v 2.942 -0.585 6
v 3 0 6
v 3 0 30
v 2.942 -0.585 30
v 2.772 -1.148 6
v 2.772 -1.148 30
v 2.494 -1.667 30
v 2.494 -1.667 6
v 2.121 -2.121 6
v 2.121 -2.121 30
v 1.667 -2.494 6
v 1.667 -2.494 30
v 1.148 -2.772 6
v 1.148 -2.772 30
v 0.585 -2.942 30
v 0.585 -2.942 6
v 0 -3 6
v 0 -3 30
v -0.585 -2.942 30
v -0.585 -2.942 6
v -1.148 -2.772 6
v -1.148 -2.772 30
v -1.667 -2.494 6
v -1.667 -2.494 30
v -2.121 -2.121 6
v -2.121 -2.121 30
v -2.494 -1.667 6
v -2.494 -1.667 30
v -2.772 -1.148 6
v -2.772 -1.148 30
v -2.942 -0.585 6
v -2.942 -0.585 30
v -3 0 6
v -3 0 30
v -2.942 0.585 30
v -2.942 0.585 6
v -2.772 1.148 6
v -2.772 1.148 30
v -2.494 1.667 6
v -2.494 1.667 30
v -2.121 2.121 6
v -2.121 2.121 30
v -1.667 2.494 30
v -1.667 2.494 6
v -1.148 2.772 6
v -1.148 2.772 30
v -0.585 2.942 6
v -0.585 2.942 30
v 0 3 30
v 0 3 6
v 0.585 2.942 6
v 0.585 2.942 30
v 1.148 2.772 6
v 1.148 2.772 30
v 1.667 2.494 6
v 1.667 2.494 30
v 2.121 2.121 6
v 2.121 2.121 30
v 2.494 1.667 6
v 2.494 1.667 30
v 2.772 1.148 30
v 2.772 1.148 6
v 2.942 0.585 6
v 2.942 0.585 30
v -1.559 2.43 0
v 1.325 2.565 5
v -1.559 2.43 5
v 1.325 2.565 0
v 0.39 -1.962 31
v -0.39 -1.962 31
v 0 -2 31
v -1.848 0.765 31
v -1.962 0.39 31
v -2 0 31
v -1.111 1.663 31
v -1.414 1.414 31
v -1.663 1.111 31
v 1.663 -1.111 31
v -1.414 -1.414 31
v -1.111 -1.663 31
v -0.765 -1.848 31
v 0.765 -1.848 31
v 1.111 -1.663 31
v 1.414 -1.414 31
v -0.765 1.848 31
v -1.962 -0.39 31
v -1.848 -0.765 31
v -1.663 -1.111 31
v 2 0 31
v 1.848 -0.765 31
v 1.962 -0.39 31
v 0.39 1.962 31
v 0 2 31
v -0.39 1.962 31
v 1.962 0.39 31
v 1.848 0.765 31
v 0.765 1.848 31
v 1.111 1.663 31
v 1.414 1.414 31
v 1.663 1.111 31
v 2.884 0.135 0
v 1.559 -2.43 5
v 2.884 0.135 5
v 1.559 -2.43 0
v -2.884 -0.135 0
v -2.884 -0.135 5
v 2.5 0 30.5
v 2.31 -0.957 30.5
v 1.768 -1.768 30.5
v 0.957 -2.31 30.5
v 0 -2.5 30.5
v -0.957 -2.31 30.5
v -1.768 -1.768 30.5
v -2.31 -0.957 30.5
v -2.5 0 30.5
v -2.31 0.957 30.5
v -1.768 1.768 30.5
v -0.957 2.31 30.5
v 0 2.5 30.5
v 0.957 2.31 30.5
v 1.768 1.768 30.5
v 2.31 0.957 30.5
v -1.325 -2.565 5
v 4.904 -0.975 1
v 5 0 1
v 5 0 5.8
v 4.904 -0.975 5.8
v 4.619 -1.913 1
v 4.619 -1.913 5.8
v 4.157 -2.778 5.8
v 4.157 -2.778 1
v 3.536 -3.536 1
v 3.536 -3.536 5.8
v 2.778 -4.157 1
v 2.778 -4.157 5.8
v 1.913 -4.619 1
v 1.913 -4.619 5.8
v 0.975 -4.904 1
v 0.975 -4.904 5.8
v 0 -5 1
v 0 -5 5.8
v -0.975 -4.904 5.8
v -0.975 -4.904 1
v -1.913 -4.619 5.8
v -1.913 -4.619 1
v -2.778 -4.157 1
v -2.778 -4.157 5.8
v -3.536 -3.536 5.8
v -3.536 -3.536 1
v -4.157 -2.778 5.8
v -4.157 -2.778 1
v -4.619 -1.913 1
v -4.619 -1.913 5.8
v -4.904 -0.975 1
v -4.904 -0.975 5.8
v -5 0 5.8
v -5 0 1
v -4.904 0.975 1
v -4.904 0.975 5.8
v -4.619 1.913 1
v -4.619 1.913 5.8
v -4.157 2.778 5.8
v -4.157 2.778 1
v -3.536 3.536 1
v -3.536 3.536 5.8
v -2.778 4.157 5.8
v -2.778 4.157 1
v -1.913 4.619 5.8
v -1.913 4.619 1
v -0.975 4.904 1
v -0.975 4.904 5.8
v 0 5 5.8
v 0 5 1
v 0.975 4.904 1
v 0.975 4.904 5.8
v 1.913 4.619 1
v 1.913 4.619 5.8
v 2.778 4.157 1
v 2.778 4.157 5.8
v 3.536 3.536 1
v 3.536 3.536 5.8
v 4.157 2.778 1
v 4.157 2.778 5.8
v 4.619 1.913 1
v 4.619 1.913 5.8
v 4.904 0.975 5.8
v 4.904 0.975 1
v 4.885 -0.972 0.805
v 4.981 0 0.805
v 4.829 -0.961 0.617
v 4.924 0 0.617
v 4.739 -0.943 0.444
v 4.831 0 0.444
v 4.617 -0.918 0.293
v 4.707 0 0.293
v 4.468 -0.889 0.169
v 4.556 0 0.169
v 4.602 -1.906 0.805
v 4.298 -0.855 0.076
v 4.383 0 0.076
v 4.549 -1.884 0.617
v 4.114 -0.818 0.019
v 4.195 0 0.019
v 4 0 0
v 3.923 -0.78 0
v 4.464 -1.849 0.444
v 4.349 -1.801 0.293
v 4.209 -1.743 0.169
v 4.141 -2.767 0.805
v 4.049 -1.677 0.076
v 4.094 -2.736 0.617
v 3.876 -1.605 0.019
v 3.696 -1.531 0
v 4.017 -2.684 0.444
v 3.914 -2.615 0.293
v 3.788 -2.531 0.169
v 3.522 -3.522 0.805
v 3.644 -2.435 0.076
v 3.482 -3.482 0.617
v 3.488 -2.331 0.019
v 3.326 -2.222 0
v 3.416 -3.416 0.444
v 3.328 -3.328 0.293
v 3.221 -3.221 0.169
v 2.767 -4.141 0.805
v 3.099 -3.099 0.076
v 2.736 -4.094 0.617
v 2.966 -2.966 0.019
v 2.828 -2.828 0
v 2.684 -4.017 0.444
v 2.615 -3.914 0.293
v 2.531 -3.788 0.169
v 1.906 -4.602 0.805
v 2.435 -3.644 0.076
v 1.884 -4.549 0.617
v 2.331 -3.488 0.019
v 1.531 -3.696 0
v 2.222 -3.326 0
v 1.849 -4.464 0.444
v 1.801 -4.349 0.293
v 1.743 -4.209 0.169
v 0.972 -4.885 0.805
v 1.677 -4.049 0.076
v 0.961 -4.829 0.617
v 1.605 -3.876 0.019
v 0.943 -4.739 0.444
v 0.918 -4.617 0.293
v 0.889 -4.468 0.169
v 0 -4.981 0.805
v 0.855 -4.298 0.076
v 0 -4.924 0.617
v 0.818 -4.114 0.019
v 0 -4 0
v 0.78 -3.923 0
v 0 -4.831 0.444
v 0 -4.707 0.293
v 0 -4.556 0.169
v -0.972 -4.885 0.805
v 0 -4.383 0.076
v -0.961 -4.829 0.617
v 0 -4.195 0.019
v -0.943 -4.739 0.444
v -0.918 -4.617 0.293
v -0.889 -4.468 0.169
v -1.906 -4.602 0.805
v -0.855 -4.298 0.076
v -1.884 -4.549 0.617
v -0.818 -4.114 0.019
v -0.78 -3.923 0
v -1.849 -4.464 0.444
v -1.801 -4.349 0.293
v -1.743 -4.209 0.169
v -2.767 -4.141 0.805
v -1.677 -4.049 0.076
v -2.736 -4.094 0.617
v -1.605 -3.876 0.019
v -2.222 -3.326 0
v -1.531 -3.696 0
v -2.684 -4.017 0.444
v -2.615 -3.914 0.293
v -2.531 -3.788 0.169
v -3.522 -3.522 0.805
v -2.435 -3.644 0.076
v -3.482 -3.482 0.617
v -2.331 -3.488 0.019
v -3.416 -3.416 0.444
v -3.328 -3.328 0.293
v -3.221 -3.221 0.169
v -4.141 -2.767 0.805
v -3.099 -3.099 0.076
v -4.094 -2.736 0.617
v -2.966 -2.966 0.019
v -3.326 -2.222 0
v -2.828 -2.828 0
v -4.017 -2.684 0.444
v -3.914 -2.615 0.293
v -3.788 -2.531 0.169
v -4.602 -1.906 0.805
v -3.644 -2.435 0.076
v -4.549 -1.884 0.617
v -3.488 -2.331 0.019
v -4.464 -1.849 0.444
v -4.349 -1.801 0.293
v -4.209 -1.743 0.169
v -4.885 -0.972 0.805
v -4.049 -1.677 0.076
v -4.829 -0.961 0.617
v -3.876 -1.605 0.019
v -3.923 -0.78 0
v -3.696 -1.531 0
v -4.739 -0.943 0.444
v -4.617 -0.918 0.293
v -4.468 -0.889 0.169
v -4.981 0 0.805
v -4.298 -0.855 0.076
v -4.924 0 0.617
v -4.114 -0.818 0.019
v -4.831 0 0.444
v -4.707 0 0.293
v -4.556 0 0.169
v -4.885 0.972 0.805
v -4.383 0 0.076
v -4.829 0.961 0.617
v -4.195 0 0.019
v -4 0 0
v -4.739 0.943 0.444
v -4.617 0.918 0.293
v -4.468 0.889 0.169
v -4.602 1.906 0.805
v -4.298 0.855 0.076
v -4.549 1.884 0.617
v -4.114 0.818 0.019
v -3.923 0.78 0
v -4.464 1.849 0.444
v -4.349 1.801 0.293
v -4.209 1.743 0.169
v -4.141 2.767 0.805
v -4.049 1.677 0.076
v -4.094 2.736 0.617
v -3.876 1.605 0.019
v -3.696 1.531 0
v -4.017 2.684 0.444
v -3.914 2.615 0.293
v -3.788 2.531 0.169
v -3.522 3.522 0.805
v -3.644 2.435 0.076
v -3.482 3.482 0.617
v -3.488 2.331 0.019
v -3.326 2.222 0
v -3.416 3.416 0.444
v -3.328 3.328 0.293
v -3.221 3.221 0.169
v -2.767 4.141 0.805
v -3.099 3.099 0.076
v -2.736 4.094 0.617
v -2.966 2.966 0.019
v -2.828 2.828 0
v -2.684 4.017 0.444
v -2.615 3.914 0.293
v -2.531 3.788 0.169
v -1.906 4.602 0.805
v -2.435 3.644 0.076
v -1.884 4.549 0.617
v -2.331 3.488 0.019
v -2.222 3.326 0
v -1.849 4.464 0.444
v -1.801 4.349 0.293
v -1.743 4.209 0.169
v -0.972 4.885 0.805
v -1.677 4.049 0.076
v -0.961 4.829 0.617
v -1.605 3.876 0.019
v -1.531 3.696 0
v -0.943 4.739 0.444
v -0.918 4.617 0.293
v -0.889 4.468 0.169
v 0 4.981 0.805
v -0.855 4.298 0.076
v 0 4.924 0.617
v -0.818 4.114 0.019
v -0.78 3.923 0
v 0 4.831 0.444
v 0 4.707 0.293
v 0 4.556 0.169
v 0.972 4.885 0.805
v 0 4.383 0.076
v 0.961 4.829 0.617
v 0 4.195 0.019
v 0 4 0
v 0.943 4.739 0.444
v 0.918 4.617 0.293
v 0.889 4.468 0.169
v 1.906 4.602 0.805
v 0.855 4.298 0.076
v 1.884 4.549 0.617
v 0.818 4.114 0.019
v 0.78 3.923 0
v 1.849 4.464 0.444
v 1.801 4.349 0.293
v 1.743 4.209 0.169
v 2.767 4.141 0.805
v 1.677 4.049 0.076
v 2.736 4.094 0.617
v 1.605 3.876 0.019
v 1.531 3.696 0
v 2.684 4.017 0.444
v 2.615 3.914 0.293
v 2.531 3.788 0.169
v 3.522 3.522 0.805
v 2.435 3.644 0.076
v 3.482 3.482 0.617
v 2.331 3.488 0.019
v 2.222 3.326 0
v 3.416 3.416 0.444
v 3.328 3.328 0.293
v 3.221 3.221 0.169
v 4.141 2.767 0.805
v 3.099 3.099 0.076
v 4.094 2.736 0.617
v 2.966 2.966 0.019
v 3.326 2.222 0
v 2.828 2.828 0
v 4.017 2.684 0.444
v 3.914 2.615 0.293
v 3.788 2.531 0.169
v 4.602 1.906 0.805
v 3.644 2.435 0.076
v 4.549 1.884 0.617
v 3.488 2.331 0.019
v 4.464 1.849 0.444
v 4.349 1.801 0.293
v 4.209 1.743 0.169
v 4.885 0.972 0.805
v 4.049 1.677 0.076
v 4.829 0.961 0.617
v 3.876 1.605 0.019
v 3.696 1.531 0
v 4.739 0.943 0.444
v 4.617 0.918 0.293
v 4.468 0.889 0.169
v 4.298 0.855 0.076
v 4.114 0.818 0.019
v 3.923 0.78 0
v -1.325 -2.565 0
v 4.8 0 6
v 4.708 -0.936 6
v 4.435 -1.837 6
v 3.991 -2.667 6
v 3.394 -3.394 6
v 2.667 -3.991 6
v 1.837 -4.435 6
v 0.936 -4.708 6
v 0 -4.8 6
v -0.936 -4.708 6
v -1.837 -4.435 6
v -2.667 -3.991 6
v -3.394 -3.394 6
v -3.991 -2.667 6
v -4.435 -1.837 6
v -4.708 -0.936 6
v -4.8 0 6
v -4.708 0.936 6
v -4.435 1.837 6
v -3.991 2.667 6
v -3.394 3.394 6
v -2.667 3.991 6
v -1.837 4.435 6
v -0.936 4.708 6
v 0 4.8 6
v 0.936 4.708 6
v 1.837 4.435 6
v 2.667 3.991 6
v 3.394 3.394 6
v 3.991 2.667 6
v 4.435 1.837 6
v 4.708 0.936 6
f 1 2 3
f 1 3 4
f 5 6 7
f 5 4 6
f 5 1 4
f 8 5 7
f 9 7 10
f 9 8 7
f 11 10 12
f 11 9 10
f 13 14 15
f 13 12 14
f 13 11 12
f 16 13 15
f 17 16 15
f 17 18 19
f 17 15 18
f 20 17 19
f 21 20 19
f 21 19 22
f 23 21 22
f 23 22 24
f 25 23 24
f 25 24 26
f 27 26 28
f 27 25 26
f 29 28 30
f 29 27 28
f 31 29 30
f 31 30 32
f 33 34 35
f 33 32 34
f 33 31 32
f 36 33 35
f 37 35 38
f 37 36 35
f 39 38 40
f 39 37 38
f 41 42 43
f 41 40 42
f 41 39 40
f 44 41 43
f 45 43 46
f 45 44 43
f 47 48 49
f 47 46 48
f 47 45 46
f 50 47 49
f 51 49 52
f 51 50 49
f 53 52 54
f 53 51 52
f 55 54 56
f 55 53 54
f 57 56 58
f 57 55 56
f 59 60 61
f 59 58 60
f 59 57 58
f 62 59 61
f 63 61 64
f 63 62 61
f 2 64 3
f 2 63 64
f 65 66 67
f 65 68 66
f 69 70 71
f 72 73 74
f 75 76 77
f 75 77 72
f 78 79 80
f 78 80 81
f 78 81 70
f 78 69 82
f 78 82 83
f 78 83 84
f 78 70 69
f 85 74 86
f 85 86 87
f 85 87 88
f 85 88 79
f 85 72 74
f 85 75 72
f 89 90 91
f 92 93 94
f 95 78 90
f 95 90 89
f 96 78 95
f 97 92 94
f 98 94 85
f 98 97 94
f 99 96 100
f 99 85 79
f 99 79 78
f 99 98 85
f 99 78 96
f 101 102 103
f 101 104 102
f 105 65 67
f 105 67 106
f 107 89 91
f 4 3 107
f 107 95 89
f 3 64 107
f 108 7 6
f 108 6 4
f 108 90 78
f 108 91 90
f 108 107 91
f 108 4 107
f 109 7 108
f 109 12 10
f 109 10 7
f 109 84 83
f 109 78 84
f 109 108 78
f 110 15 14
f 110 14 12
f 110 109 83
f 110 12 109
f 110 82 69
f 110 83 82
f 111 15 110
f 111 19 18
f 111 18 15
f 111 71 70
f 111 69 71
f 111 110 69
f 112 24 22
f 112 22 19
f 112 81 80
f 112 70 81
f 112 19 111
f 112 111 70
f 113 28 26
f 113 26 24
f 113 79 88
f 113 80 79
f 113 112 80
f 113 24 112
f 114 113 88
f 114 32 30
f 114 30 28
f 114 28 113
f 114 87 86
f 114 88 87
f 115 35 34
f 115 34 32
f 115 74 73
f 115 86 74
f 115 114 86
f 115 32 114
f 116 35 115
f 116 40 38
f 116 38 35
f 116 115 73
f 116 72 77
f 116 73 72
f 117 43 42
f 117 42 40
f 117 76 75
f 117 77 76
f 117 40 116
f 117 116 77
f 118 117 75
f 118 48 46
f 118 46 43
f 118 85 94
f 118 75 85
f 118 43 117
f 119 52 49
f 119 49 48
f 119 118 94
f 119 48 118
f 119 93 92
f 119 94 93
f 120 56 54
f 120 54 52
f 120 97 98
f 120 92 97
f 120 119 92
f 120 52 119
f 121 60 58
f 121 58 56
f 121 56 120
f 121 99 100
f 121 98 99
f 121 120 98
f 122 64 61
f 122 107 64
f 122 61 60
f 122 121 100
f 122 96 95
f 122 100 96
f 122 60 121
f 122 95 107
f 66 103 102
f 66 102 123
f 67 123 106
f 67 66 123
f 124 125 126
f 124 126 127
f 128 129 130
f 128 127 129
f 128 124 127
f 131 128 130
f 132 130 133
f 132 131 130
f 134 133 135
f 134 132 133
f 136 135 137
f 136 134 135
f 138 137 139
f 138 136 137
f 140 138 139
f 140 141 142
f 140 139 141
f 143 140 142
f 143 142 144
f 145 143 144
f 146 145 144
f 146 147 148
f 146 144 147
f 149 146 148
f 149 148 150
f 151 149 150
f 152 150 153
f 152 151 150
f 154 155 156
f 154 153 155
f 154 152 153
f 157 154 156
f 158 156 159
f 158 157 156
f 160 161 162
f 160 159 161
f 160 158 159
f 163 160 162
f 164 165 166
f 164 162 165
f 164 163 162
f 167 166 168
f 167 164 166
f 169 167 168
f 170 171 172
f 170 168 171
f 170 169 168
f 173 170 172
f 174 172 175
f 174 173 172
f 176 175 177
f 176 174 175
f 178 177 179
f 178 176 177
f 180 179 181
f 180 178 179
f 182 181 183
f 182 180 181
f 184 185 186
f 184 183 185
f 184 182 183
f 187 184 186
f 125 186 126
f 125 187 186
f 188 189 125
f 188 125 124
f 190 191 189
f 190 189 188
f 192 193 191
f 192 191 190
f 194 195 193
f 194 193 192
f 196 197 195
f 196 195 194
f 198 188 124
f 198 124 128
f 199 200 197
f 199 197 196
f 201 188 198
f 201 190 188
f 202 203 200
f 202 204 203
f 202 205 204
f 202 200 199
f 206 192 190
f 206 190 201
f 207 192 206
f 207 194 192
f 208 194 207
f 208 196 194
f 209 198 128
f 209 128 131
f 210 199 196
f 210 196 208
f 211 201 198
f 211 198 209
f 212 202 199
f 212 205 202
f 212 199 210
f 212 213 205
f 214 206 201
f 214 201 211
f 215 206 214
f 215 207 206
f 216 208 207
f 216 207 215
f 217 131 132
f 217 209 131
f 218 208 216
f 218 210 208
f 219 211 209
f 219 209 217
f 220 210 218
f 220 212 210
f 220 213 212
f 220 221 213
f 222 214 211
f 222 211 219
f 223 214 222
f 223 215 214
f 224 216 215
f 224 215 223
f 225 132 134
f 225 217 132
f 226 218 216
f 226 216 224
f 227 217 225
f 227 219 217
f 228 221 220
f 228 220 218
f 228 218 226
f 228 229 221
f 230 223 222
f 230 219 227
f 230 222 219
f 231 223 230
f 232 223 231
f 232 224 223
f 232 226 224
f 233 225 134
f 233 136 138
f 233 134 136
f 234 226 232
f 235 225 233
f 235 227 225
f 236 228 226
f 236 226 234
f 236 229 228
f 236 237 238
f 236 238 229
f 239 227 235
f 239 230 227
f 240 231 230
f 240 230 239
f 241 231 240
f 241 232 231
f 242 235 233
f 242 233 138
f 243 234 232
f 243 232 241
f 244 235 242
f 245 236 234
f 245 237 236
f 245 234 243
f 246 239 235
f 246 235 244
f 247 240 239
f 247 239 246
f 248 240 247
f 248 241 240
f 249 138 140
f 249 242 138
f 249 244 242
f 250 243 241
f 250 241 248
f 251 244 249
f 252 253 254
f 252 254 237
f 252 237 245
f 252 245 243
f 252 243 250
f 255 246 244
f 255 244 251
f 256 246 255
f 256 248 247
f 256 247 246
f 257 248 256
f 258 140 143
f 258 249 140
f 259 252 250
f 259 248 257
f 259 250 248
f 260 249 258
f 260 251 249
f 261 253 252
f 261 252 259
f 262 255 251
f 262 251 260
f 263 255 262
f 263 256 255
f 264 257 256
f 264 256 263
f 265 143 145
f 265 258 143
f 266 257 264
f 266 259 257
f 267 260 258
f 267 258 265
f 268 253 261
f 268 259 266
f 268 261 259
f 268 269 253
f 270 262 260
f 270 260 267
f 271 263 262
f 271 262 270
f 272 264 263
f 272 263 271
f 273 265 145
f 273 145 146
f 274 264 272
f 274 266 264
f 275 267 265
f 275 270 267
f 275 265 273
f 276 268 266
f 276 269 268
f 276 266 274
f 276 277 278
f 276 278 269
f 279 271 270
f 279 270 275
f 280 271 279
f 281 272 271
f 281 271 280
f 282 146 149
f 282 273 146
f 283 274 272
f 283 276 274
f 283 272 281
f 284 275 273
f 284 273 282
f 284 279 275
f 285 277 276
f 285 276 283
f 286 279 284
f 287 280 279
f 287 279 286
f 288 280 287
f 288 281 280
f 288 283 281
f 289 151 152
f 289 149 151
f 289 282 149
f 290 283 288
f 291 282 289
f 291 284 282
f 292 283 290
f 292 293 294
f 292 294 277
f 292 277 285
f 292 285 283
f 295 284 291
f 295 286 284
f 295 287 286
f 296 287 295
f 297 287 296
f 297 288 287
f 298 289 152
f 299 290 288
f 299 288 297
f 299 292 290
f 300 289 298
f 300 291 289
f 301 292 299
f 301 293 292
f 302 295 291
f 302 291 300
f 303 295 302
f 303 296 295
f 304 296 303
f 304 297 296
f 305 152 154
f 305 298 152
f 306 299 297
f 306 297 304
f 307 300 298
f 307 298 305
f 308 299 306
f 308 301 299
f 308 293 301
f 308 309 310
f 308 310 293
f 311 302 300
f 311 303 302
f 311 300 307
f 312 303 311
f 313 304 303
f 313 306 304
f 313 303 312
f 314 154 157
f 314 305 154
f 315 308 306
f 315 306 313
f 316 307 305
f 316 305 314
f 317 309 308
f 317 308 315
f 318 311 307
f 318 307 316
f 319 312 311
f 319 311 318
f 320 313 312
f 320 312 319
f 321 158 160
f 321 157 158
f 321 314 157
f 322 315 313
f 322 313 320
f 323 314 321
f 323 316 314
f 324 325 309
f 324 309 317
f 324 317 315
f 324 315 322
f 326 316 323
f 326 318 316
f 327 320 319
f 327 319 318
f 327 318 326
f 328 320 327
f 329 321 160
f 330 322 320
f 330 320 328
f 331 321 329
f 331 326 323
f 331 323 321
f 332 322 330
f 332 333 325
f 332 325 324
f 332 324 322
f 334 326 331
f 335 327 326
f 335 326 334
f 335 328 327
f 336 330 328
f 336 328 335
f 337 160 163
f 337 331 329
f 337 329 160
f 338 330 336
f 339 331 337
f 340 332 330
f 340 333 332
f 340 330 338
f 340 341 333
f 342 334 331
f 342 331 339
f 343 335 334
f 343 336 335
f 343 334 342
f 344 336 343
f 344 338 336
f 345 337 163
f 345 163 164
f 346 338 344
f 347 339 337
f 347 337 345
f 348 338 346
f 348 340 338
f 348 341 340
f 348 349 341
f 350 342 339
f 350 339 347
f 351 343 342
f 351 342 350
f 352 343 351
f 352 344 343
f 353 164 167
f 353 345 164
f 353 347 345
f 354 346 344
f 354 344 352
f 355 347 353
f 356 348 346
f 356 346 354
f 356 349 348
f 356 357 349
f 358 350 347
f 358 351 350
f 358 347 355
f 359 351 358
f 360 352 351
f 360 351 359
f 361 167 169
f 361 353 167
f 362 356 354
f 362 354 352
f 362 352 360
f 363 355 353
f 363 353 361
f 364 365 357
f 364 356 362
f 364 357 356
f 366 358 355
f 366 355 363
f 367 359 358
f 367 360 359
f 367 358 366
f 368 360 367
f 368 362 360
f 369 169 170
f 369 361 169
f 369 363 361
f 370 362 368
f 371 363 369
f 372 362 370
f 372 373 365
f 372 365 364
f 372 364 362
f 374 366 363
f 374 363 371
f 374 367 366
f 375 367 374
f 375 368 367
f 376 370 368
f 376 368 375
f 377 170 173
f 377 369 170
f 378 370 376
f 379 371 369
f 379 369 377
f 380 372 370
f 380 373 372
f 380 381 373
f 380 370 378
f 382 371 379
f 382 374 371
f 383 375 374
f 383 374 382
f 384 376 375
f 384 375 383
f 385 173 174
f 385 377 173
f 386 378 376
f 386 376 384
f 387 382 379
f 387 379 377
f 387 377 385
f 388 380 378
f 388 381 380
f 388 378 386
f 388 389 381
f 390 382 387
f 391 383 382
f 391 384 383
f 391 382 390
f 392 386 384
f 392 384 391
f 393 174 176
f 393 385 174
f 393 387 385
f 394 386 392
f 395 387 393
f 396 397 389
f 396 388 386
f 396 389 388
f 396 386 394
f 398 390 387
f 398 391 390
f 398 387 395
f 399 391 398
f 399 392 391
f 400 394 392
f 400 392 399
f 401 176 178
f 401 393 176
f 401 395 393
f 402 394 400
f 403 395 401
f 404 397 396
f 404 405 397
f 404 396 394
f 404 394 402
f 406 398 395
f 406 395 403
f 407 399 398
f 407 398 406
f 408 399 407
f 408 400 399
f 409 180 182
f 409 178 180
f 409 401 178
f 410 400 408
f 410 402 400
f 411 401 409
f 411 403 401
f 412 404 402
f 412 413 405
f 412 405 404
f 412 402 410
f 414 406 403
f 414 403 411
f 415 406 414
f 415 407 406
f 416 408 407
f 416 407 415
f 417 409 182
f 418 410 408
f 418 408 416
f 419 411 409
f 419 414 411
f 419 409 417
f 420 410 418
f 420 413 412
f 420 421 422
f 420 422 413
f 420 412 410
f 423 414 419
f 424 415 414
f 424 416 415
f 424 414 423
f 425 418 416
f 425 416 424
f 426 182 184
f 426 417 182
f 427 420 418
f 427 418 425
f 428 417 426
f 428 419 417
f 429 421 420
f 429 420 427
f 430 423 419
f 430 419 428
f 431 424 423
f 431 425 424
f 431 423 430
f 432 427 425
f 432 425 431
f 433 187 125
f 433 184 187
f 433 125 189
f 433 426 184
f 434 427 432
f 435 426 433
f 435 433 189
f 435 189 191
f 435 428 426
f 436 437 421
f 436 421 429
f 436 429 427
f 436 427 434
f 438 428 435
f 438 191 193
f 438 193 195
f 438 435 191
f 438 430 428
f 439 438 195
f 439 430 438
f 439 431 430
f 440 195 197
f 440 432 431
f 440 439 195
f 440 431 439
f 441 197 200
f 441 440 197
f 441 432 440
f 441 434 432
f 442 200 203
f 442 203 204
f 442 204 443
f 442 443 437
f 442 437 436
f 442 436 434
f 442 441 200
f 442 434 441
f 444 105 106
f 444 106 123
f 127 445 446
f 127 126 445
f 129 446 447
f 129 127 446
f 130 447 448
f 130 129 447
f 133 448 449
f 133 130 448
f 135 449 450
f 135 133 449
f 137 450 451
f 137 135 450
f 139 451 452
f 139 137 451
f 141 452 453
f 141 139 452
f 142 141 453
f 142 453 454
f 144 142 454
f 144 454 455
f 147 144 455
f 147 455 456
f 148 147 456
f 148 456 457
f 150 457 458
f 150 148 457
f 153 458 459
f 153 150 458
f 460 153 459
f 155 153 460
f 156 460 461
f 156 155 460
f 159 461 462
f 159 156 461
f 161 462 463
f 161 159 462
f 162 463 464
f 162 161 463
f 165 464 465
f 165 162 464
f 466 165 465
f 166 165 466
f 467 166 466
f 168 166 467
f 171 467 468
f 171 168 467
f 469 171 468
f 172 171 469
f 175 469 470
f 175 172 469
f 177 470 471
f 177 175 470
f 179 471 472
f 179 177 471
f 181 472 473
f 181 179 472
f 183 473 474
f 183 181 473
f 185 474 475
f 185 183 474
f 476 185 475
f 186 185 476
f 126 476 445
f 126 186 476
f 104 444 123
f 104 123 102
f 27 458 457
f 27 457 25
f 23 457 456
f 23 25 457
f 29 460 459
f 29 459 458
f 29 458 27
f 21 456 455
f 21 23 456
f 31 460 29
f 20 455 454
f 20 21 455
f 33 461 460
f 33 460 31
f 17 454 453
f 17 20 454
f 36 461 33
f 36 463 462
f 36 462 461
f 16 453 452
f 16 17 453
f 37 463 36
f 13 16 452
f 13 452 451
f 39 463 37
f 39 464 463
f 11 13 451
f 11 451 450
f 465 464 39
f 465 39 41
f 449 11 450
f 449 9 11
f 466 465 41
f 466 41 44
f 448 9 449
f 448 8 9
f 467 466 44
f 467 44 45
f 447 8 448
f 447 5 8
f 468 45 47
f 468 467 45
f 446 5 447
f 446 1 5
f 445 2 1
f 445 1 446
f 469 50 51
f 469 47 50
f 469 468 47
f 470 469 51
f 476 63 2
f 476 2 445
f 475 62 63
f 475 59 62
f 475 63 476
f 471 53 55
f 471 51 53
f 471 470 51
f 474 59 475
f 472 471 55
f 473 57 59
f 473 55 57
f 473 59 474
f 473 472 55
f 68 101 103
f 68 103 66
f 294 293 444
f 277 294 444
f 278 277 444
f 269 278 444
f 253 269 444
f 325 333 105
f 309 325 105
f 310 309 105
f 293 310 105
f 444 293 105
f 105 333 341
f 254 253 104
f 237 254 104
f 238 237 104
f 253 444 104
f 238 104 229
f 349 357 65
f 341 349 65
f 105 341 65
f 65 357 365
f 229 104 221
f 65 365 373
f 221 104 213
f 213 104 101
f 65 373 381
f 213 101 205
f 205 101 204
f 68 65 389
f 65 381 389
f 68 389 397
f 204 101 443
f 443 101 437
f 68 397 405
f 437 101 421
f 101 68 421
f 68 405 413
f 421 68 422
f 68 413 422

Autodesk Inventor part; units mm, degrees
ref_plane "YZ Plane" through (0, 0, 0) normal (1, 0, 0) x (0, 1, 0)
ref_plane "XZ Plane" through (0, 0, 0) normal (0, 1, 0) x (-1, 0, 0)
ref_plane "XY Plane" through (0, 0, 0) normal (0, 0, 1) x (1, 0, 0)
sketch "Sketch1" plane through (0, 0, 0) normal (0, 0, 1) x (1, 0, 0)
  circle A0 centre (0, 0) radius 5
  dimension "d0" = 10
extrude "Extrusion1" add sketch "Sketch1" along normal blind 6
sketch "Sketch2" plane through (0, 0, 6) normal (0, 0, 1) x (1, 0, 0)
  circle A0 centre (0, 0) radius 5 projected
  circle A1 centre (0, 0) radius 3
  dimension "d3" = 6
extrude "Extrusion2" add sketch "Sketch2" along normal blind 25 contours A1
thread "Thread1" size "M6x1" class "6g" standard "ANSI Metric M Profile" full length
chamfer "Chamfer1" distance 1 angle 45 1 edges at (-3, 0, 31)
chamfer "Chamfer2" distance 0.2 angle 45 1 edges at (-5, 0, 6)
fillet "Fillet1" radius 1 1 edges at (-5, 0, 0)
sketch "Sketch3" plane through (0, 0, 0) normal (0, 0, -1) x (-1, 0, 0)
  circle A0 centre (0, 0) radius 4 projected
  line L0 (1.5588, 2.4297) -> (2.8836, -0.135)
  line L1 (2.8836, -0.135) -> (1.3248, -2.5648)
  line L2 (1.3248, -2.5648) -> (-1.5588, -2.4297)
  line L3 (-1.5588, -2.4297) -> (-2.8836, 0.135)
  line L4 (-2.8836, 0.135) -> (-1.3248, 2.5648)
  line L5 (-1.3248, 2.5648) -> (1.5588, 2.4297)
  dimension "d15" = 5
extrude "Extrusion3" cut sketch "Sketch3" against normal blind 5 contours L0 L1 L2 L3 L4 L5
properties part number "PERNO PARKER M6"
